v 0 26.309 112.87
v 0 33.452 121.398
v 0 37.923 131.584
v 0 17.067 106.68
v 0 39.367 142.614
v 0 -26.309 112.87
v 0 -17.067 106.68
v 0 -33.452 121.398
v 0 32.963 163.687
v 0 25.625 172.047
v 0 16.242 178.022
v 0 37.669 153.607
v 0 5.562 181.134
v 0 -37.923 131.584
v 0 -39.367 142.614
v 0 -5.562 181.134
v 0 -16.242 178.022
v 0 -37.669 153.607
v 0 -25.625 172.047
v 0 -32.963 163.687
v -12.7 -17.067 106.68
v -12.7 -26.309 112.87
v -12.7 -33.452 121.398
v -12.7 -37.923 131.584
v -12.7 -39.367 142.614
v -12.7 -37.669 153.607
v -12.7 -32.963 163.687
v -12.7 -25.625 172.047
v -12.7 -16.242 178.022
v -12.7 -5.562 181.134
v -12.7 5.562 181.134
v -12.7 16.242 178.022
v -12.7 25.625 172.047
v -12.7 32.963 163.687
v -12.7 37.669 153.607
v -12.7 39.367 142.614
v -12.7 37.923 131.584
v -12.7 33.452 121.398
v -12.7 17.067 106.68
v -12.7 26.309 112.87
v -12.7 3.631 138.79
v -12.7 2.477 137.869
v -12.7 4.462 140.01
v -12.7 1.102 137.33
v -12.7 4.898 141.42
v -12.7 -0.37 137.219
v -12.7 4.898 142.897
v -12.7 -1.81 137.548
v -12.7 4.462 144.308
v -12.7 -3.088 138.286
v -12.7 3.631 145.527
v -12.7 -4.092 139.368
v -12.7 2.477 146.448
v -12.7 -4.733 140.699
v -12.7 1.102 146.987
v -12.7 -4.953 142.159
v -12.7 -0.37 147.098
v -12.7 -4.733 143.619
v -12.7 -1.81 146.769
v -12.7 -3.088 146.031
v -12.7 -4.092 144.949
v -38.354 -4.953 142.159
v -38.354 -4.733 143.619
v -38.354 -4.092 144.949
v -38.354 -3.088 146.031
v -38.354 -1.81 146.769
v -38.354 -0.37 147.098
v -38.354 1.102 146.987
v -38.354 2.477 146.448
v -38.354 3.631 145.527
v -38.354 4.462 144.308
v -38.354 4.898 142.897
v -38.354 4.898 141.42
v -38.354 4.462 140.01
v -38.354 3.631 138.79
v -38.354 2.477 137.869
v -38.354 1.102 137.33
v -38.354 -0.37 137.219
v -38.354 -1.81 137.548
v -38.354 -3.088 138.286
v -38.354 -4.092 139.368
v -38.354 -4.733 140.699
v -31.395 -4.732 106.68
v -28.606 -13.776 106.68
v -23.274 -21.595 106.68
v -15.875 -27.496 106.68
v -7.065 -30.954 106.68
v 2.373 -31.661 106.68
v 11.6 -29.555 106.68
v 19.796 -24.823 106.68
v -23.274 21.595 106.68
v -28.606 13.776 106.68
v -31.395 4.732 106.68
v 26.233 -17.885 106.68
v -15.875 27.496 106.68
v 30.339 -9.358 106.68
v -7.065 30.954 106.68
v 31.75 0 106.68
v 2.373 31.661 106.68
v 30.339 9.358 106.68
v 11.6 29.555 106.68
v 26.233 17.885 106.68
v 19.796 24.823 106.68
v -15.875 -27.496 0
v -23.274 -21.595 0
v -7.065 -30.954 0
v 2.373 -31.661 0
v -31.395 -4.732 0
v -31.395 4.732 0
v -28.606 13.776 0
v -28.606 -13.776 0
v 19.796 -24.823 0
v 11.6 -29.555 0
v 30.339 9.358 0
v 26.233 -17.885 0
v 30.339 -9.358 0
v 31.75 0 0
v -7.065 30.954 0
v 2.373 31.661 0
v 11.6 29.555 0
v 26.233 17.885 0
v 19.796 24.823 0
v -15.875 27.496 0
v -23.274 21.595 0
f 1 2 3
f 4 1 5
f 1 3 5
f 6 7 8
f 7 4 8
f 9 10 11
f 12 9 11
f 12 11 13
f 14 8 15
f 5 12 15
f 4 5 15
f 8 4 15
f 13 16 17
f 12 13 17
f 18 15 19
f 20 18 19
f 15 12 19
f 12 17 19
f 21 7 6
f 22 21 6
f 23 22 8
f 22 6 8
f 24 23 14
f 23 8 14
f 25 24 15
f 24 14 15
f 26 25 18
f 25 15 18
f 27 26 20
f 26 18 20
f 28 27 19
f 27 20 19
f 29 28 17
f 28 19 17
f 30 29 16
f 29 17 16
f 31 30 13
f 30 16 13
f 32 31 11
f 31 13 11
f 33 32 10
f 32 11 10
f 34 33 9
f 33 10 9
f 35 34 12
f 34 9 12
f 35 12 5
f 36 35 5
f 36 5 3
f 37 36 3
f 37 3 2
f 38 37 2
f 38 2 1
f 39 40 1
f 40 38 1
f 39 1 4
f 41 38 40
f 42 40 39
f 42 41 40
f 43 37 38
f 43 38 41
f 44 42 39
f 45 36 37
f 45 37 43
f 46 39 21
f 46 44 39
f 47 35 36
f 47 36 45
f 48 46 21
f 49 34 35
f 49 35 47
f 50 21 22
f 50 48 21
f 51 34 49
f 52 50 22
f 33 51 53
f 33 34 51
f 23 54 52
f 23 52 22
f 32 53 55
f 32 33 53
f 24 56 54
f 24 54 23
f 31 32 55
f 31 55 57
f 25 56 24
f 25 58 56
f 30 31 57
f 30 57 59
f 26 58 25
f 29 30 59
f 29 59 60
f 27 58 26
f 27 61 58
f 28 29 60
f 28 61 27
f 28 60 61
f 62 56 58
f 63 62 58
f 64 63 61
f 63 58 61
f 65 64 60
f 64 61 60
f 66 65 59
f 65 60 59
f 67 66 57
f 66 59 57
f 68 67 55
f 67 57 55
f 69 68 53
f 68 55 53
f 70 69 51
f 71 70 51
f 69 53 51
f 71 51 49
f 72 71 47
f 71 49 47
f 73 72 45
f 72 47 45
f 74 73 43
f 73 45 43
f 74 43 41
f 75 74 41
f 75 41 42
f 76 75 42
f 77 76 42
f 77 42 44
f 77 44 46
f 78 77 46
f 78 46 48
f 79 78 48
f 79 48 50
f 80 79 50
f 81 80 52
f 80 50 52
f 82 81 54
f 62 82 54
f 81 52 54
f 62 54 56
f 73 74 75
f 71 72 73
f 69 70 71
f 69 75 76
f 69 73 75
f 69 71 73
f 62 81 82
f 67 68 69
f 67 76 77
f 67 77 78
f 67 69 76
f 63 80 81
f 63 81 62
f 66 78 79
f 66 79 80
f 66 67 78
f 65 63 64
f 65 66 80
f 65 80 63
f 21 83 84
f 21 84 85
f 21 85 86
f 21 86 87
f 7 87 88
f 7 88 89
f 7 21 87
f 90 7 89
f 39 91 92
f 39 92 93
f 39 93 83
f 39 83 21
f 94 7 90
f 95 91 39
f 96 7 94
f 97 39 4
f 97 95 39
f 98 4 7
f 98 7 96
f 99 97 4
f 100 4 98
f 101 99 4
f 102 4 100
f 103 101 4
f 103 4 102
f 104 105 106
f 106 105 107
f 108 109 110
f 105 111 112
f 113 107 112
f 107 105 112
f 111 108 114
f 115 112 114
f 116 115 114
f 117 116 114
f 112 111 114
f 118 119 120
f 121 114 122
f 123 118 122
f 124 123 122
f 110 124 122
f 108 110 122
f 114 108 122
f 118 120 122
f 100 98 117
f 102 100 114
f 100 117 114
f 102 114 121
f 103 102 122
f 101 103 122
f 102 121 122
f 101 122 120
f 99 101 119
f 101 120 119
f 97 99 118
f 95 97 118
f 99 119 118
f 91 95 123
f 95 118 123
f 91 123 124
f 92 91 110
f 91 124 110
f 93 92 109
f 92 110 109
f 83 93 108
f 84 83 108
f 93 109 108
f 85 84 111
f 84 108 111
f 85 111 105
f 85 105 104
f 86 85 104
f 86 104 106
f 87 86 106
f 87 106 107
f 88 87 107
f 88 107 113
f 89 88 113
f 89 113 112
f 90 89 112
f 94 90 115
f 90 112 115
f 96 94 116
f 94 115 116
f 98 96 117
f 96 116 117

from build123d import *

# Parameters (mm, degrees)
F0_R     = 31.75
F1_DEPTH = 106.68
F4_R     = 39.37
F5_DEPTH = 12.7
F6_R     = 4.953
F7_DEPTH = 25.654


with BuildPart() as f1:
    # F0 (on Top) → F1 (new body)
    with BuildSketch(Plane.XY):
        Circle(F0_R)
    extrude(amount=F1_DEPTH)

    # F4 (on face) → F5 (join)
    with BuildSketch(Plane(origin=(0, 0, 0), x_dir=(0, -1, 0), z_dir=(-1, 0, 0))):
        with Locations((0, 142.158583)):
            Circle(F4_R)
    extrude(amount=F5_DEPTH)

    # F6 (on face) → F7 (join)
    with BuildSketch(Plane(origin=(-12.7, 0, 0), x_dir=(0, -1, 0), z_dir=(-1, 0, 0))):
        with Locations((0, 142.158583)):
            Circle(F6_R)
    extrude(amount=F7_DEPTH)


solid = f1.part
